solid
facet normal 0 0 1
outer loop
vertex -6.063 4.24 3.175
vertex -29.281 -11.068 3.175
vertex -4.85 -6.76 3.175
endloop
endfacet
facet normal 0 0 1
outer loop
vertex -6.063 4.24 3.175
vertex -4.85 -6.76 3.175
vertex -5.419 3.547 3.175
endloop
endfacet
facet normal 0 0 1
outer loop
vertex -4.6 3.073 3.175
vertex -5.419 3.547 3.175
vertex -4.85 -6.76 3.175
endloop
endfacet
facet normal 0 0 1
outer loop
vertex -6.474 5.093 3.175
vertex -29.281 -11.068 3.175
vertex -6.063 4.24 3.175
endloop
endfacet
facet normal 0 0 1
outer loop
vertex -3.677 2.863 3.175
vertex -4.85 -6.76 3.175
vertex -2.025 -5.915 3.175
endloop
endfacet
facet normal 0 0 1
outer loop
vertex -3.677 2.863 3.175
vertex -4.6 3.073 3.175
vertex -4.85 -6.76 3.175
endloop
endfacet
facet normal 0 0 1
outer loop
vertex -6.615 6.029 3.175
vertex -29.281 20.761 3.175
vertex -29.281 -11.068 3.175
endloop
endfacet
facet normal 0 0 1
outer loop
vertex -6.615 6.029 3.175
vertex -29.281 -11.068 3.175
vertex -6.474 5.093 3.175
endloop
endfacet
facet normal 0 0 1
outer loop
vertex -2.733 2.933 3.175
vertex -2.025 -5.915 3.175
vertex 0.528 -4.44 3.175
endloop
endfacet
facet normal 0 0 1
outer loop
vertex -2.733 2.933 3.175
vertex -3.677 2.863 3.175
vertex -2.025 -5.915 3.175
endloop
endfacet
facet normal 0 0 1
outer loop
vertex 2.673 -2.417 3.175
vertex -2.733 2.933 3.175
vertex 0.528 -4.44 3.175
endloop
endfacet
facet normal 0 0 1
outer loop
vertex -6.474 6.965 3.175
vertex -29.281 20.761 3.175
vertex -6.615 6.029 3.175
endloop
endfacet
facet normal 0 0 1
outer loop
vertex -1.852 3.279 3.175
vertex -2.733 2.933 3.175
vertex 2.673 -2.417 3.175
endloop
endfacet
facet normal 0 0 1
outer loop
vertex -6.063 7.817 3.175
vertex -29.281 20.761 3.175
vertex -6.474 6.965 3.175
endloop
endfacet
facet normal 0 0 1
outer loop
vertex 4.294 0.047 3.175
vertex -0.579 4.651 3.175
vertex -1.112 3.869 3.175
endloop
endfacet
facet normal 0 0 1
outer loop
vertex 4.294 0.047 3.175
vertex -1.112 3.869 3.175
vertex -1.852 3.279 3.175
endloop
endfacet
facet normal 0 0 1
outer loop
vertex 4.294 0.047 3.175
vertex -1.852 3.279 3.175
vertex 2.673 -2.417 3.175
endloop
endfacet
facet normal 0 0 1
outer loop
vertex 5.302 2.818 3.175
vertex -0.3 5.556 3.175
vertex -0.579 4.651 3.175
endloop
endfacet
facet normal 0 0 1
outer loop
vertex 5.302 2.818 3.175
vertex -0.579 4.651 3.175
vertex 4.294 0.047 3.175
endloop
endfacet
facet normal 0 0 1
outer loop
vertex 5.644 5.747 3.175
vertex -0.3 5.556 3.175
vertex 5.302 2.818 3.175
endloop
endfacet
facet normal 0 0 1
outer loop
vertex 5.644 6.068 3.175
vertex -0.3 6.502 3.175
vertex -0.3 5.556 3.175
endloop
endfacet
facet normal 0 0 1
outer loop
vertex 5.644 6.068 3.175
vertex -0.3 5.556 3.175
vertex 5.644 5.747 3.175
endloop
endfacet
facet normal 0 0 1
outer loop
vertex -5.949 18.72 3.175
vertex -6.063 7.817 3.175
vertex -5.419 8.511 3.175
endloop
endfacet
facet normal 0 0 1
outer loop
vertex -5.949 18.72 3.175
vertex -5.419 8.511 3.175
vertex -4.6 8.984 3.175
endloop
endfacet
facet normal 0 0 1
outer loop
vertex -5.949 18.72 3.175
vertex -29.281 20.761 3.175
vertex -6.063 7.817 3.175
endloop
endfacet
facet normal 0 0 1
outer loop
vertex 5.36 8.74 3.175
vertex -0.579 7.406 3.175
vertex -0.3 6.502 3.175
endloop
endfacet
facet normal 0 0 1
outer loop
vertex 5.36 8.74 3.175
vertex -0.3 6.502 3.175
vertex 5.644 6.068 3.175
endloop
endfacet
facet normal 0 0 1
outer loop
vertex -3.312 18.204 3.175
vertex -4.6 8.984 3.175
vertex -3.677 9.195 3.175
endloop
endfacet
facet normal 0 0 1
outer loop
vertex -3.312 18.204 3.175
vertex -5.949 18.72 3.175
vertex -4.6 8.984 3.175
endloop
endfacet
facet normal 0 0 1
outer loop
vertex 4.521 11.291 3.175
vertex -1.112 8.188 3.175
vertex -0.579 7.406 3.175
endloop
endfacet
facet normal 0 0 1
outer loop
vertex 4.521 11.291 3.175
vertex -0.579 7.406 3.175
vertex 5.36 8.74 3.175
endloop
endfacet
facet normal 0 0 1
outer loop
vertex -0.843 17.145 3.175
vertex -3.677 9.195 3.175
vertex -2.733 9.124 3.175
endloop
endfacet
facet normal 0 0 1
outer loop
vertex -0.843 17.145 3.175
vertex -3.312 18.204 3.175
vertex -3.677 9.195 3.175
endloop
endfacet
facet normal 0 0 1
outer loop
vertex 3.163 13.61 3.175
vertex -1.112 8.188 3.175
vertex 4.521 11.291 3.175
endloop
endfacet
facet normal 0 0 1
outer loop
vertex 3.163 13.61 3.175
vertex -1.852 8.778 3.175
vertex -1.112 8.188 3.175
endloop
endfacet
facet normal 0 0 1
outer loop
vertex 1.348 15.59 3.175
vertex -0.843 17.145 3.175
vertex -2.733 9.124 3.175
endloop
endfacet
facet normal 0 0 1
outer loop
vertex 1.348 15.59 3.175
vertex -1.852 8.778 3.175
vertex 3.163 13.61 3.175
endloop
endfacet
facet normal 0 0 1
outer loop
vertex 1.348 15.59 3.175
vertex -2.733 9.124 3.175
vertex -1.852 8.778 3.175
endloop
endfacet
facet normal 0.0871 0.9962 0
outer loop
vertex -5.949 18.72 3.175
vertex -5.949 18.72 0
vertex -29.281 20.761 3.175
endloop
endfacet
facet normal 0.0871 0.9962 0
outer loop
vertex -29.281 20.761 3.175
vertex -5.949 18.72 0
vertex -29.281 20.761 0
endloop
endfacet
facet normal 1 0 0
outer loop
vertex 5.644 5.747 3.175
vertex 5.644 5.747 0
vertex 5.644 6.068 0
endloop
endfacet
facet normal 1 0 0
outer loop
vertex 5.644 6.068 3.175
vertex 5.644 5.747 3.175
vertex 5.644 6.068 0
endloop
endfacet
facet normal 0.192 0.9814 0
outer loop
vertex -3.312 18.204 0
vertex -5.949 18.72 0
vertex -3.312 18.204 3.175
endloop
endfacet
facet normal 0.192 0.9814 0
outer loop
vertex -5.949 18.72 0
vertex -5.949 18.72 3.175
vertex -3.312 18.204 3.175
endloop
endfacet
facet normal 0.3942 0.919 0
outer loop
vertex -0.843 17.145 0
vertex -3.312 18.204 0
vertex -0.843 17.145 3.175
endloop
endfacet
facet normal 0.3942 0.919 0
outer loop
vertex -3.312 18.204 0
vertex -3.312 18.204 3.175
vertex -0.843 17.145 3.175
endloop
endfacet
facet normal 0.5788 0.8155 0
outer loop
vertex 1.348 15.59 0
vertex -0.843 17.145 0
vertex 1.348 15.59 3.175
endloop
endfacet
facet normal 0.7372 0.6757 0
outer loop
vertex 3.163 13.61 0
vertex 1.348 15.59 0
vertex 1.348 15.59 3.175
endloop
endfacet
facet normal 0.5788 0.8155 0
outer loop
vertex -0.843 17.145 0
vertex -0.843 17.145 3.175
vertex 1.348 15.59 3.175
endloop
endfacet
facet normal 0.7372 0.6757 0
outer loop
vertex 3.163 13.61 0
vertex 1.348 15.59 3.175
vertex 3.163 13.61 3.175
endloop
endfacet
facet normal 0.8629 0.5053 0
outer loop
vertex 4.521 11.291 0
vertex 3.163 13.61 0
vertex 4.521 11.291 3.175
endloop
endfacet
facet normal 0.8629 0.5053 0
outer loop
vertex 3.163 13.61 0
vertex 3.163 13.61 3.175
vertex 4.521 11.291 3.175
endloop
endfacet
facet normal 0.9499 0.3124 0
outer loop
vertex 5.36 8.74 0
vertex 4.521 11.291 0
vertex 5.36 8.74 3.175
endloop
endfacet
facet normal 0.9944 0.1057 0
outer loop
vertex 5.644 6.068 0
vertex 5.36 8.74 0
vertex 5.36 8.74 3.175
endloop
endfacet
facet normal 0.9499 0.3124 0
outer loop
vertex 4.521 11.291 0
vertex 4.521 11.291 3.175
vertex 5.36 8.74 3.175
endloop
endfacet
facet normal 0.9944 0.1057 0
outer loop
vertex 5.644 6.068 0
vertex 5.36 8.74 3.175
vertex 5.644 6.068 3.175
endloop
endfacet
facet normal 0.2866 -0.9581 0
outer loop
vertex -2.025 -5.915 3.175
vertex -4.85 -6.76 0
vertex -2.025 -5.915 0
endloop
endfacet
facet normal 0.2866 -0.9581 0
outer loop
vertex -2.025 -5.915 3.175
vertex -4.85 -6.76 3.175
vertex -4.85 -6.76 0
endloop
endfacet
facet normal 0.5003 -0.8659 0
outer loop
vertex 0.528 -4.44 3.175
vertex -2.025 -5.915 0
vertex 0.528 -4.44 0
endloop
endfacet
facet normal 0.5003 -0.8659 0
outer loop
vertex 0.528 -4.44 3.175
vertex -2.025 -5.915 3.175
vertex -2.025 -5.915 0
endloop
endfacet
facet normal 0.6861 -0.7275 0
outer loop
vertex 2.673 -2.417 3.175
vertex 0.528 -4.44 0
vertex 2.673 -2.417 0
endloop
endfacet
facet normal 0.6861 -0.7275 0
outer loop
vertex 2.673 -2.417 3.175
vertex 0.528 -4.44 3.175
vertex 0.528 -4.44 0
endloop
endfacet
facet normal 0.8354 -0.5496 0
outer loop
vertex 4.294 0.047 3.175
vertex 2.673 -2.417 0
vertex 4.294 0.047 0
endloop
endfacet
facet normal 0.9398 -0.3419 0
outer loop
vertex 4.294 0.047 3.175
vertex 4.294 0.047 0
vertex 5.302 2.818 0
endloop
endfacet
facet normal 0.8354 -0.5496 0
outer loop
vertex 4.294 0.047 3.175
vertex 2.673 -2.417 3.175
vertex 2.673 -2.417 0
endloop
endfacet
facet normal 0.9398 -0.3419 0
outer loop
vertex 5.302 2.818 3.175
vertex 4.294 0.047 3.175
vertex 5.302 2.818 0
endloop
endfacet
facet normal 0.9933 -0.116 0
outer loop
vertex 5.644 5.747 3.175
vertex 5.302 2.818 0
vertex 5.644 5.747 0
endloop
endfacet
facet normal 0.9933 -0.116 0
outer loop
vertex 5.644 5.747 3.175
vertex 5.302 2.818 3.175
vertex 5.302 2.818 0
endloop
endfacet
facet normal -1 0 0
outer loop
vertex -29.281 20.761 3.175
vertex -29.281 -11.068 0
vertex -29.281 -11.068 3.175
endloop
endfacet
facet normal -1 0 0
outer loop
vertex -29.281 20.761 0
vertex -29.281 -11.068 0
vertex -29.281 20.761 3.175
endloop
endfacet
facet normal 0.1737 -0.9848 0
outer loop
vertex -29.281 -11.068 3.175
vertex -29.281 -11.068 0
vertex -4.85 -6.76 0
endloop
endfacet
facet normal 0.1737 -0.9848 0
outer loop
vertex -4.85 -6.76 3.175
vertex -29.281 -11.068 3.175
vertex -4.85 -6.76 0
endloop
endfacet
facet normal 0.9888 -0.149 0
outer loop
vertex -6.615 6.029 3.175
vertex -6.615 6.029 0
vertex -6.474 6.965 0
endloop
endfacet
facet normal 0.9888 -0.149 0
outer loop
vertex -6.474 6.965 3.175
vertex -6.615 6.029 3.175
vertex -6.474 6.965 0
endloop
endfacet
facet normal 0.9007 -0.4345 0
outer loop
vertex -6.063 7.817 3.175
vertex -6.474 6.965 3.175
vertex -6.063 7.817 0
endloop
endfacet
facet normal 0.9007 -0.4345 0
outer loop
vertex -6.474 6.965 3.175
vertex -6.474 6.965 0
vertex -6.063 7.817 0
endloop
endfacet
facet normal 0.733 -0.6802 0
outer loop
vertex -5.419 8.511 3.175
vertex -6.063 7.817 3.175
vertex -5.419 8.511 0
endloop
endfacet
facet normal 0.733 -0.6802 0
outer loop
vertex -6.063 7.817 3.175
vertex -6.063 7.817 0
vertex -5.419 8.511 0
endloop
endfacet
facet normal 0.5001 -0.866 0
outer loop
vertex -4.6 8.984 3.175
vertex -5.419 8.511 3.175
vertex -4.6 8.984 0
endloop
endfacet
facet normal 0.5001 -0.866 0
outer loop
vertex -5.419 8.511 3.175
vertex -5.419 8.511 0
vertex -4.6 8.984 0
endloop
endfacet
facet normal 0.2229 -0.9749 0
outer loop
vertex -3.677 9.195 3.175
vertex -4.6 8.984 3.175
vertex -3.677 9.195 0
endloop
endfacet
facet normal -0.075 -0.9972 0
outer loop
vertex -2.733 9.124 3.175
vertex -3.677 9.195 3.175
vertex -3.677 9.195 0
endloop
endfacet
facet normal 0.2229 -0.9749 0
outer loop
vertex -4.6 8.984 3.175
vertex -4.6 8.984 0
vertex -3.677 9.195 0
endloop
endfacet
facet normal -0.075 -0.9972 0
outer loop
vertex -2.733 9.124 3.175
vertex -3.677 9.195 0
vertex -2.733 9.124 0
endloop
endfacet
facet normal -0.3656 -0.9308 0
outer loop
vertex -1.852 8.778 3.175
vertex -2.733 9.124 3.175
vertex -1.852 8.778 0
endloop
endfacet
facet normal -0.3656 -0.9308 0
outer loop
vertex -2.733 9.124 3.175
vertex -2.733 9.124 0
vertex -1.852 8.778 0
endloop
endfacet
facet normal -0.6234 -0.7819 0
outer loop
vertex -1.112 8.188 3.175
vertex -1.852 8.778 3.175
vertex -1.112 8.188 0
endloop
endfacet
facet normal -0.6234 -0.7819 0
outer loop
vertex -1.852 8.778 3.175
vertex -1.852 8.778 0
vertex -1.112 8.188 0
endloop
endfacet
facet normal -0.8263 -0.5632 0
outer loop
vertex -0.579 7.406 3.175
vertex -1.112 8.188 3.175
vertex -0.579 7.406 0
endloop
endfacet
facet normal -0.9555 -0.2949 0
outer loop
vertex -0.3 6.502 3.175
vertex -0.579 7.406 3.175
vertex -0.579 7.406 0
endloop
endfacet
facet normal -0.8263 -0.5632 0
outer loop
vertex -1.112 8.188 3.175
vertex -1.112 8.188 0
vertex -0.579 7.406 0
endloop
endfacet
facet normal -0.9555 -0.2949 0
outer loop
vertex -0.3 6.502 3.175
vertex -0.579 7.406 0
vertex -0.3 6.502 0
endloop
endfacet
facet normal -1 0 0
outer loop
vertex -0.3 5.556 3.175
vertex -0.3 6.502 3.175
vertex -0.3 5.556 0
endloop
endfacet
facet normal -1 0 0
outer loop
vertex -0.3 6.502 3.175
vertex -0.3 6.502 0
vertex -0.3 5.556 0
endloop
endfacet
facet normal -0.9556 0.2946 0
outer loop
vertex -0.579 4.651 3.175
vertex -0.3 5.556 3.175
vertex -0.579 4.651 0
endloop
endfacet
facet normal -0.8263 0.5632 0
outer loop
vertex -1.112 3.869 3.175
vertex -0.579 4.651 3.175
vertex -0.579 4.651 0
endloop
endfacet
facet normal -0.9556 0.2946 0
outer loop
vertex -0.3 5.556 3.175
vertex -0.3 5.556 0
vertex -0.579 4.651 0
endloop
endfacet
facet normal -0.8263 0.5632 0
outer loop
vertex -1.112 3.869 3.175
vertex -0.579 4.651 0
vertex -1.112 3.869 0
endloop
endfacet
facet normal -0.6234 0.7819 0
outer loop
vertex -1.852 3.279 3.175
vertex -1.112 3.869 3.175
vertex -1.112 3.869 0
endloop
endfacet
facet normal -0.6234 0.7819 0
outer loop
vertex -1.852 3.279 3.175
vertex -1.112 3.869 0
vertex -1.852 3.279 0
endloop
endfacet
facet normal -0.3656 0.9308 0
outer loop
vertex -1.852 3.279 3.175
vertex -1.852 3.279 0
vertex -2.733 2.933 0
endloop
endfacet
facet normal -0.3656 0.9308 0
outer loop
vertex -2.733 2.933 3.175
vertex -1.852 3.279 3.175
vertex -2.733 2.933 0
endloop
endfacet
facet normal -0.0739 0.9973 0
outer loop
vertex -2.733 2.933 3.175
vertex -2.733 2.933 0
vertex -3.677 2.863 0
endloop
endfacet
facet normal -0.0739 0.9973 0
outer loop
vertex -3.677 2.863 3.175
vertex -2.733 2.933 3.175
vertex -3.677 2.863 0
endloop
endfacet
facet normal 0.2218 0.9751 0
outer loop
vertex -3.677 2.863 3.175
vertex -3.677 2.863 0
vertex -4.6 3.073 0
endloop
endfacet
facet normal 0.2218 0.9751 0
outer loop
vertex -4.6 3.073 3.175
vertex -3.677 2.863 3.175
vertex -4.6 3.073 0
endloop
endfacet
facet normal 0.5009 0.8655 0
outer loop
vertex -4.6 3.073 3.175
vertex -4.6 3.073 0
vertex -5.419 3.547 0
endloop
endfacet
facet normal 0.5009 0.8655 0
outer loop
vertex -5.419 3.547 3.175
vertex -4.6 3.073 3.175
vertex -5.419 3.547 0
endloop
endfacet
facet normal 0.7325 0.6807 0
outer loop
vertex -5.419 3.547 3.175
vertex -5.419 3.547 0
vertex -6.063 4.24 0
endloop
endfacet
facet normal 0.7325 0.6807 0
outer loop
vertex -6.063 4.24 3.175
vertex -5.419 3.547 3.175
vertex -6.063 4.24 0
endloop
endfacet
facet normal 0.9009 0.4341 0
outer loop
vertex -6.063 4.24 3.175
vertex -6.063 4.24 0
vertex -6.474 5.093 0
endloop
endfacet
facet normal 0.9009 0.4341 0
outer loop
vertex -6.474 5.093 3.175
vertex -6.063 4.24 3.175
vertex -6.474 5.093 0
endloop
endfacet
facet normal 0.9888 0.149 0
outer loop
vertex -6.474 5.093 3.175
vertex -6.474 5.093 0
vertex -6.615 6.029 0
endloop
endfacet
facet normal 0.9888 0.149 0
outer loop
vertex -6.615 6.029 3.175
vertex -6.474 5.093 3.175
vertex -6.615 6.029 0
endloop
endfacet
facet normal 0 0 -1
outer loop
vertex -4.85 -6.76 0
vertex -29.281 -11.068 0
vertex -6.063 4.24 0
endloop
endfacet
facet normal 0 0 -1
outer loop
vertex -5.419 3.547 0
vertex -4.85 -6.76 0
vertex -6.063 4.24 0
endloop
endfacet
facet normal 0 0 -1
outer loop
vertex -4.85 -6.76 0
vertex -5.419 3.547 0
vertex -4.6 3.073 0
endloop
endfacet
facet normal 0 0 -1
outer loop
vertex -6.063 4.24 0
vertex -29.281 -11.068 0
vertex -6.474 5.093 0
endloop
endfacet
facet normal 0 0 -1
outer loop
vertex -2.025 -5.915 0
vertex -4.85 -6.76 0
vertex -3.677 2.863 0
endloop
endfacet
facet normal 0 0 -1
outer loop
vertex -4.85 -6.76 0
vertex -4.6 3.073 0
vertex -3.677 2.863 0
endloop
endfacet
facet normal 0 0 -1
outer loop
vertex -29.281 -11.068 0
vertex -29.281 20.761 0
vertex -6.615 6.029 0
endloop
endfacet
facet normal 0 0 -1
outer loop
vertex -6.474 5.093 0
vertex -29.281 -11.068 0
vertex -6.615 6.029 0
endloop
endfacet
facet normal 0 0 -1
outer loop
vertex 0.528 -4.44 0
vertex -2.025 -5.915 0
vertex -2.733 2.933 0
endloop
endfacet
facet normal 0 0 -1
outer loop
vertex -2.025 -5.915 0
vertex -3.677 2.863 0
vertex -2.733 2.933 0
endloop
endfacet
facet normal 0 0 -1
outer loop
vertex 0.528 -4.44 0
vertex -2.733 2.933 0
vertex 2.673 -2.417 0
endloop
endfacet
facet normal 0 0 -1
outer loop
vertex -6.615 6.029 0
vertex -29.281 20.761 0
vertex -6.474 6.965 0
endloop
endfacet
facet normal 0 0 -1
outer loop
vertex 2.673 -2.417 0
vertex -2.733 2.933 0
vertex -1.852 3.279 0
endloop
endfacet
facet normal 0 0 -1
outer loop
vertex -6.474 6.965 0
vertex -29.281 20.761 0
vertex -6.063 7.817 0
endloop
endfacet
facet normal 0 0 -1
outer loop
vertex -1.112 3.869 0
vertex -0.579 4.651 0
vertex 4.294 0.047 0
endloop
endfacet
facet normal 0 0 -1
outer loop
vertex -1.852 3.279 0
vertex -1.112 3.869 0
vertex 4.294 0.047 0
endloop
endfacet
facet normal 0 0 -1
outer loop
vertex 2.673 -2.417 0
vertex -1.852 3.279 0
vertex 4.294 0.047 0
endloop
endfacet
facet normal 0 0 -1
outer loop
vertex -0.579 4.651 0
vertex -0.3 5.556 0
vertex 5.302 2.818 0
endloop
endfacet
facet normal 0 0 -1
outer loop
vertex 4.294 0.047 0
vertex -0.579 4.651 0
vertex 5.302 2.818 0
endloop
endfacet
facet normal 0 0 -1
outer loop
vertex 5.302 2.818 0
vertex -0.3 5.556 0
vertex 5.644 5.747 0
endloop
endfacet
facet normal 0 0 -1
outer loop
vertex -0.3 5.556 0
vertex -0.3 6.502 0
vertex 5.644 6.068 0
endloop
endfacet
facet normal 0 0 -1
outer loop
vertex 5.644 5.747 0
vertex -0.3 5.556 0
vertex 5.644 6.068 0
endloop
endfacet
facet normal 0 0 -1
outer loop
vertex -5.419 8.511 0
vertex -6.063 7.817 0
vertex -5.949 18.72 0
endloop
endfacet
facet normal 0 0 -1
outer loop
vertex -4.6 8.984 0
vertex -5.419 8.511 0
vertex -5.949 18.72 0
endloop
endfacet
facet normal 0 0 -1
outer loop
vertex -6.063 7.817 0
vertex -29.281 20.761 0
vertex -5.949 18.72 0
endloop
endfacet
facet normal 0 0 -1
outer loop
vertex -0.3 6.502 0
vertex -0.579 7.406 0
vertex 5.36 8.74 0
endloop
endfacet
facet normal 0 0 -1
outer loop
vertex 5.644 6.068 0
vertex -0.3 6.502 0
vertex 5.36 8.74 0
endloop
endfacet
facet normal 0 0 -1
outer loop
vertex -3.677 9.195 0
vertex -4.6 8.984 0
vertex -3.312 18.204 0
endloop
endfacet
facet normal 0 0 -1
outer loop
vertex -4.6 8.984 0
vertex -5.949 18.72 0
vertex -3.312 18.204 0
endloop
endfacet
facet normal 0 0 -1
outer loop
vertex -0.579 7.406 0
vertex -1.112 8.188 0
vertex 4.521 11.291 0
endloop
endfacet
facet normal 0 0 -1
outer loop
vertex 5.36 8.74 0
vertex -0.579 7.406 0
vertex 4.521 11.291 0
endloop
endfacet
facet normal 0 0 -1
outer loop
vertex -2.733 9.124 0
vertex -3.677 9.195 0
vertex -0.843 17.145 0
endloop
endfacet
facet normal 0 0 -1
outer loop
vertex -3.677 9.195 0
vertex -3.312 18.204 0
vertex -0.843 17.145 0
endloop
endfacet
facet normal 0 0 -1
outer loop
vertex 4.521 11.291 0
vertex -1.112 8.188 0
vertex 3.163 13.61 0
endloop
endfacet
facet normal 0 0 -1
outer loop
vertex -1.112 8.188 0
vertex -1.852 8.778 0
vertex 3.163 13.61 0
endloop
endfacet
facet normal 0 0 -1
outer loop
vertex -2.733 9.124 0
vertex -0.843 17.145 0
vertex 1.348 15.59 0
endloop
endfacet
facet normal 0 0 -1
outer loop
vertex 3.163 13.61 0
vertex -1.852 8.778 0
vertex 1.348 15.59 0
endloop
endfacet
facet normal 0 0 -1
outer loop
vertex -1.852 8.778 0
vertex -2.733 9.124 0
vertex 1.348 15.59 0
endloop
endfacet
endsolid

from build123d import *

# Parameters (mm, degrees)
SKETCH1_W                       = 66.08808118
SKETCH1_H                       = 37.717352964
BOSS_EXTRUDE1_DEPTH             = 3.175
F_1_4_0_25_DIAMETER_HOLE1_D     = 6.35
F_1_4_0_25_DIAMETER_HOLE1_DEPTH = 9.268267535
F_1_4_0_25_DIAMETER_HOLE1_TIP   = 1.907732465
CUT_EXTRUDE1_DEPTH              = 43.378010118
FILLET1_R                       = 12.7


with BuildPart() as part:
    # Sketch1 → Boss-Extrude1 (new body)
    with BuildSketch(Plane.XY):
        with Locations((3.763463947, 1.902410347)):
            Rectangle(SKETCH1_W, SKETCH1_H)
    extrude(amount=BOSS_EXTRUDE1_DEPTH)

    # 1/4 (0.25) Diameter Hole1
    with Locations(Plane.XY.offset(3.175)):
        with Locations((-3.439886643, 6.028832829)):
            Hole(F_1_4_0_25_DIAMETER_HOLE1_D / 2, depth=F_1_4_0_25_DIAMETER_HOLE1_DEPTH)
            with Locations((0, 0, -(F_1_4_0_25_DIAMETER_HOLE1_DEPTH + F_1_4_0_25_DIAMETER_HOLE1_TIP / 2))):  # 118° drill point
                Cone(0, F_1_4_0_25_DIAMETER_HOLE1_D / 2, F_1_4_0_25_DIAMETER_HOLE1_TIP, mode=Mode.SUBTRACT)

    # Sketch4 → Cut-Extrude1 (cut, through all)
    with BuildSketch(Plane(origin=(0, 0, 0), x_dir=(-1, 0, 0), z_dir=(0, 0, -1))):
        Polygon((-5.644423357, 17.705545255), (29.280576643, 20.761086829), (-36.807504537, 20.761086829), (-36.807504537, -16.956266135), (29.280576643, -16.956266135), (29.280576643, -11.068161171), (-5.644423357, -4.90994137), align=None)
    extrude(amount=-CUT_EXTRUDE1_DEPTH, mode=Mode.SUBTRACT)

    # Fillet1
    fillet1_edges = [part.edges().sort_by_distance(p)[0] for p in [
        (5.644423357, 17.705545255, 1.5875),
        (5.644423357, -4.90994137, 1.5875),
    ]]
    fillet(fillet1_edges, radius=FILLET1_R)


solid = part.part
